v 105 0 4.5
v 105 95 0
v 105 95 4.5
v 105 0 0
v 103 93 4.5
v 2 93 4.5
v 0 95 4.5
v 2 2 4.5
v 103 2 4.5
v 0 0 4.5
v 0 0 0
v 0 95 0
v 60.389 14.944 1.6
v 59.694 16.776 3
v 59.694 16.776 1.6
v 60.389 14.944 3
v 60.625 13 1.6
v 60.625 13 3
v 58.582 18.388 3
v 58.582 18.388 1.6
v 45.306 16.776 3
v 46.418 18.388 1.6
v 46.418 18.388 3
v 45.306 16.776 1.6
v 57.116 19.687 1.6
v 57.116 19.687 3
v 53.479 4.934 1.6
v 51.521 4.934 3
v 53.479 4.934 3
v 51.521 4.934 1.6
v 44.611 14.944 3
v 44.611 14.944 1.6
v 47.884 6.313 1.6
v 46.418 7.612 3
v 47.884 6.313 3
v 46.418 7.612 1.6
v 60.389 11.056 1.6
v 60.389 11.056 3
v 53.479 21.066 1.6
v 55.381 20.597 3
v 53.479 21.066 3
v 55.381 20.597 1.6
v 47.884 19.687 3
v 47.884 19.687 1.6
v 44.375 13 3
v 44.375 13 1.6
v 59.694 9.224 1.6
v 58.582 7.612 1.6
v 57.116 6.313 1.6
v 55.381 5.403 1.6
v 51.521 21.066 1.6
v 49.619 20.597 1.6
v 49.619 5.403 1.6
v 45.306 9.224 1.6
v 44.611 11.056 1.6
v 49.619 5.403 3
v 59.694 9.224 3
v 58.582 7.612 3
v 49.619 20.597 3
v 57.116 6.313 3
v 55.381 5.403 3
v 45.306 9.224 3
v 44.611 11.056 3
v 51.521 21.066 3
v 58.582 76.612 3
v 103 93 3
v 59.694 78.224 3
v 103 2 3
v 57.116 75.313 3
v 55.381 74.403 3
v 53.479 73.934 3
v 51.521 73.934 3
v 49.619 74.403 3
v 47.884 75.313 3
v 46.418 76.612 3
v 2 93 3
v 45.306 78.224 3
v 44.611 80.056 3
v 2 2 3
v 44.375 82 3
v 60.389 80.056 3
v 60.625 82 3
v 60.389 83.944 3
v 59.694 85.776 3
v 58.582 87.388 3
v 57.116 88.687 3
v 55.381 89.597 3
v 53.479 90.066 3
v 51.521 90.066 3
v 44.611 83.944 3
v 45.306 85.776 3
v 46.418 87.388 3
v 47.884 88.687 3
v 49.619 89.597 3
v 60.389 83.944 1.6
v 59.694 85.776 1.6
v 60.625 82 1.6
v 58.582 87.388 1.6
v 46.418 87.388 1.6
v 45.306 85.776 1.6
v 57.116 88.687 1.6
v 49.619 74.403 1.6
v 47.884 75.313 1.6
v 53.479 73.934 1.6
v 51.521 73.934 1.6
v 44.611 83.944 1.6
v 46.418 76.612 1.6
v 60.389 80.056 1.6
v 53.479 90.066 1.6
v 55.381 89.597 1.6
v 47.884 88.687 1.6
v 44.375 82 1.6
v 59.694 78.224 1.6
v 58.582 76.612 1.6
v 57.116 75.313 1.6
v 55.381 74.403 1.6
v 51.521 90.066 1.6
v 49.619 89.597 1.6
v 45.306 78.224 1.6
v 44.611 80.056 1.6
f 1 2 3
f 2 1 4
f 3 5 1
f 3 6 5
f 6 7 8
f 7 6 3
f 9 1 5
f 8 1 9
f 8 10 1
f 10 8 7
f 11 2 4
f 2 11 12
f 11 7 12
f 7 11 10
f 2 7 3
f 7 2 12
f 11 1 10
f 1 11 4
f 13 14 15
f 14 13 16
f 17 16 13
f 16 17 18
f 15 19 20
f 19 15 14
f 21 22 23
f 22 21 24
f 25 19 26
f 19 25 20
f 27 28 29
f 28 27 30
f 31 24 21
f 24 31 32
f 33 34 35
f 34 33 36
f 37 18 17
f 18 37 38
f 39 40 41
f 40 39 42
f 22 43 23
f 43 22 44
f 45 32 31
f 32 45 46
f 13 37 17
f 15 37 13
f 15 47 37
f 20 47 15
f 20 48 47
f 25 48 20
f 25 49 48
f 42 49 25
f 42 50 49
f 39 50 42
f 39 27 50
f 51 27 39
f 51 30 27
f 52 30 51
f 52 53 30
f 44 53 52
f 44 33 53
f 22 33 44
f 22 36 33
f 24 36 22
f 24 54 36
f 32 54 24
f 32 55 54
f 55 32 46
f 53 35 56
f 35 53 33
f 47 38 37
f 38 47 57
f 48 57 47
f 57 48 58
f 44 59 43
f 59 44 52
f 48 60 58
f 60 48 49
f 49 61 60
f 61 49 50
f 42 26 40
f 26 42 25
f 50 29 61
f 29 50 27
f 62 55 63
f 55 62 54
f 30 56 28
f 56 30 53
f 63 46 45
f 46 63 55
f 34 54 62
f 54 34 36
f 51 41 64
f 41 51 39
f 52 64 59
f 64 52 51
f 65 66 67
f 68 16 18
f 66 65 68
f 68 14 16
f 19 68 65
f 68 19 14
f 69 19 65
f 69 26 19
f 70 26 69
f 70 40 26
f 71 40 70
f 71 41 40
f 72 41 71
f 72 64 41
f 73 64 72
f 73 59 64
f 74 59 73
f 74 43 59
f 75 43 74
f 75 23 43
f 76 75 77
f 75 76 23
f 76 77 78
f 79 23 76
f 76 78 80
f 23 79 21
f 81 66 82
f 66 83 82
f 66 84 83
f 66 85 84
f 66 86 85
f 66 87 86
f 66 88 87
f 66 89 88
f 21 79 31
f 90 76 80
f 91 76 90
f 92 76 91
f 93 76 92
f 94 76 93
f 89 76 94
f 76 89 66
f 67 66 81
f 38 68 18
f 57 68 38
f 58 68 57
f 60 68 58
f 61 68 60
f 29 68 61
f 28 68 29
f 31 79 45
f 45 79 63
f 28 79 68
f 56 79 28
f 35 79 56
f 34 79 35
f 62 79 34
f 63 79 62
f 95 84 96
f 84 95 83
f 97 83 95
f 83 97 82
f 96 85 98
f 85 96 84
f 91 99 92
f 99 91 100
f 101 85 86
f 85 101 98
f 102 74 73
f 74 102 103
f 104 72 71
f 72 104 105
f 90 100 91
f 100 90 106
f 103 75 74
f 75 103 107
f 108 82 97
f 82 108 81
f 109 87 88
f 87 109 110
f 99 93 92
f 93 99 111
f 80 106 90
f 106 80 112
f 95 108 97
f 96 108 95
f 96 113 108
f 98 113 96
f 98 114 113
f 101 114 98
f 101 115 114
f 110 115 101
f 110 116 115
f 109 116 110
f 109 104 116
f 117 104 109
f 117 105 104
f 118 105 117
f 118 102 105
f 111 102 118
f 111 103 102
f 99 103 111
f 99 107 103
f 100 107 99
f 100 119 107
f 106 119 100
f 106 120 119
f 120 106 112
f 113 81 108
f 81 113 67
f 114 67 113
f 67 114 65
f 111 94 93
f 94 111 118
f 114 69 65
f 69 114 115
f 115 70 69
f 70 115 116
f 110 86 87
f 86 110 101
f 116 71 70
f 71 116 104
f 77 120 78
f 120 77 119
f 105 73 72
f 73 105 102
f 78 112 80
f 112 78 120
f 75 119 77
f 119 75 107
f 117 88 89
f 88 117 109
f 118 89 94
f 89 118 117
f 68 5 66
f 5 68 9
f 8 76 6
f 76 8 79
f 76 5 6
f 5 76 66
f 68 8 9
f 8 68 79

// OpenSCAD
length = 100;
width = 90;
height = 3;
rimHeight = 1.5;
rimThickness = 2;

//Based on washer size:
washerDiameter = 16.25;
washerHeight = 1.4;
rimPadding = 1;

totalLength = length + rimThickness * 2 + rimPadding;
totalWidth = width + rimThickness * 2 + rimPadding;
difference() {
    cube([totalLength, totalWidth, height + rimHeight]);
    translate([totalLength/2, 10 + rimThickness + rimPadding, height - washerHeight])
        cylinder(washerHeight, d=washerDiameter);
    translate([totalLength/2, totalWidth - (rimThickness + 10 + rimPadding), height - washerHeight])
        cylinder(washerHeight, d=washerDiameter);
    translate([rimThickness, rimThickness, height])
        cube([length + rimPadding, width + rimPadding, rimHeight]);
}
